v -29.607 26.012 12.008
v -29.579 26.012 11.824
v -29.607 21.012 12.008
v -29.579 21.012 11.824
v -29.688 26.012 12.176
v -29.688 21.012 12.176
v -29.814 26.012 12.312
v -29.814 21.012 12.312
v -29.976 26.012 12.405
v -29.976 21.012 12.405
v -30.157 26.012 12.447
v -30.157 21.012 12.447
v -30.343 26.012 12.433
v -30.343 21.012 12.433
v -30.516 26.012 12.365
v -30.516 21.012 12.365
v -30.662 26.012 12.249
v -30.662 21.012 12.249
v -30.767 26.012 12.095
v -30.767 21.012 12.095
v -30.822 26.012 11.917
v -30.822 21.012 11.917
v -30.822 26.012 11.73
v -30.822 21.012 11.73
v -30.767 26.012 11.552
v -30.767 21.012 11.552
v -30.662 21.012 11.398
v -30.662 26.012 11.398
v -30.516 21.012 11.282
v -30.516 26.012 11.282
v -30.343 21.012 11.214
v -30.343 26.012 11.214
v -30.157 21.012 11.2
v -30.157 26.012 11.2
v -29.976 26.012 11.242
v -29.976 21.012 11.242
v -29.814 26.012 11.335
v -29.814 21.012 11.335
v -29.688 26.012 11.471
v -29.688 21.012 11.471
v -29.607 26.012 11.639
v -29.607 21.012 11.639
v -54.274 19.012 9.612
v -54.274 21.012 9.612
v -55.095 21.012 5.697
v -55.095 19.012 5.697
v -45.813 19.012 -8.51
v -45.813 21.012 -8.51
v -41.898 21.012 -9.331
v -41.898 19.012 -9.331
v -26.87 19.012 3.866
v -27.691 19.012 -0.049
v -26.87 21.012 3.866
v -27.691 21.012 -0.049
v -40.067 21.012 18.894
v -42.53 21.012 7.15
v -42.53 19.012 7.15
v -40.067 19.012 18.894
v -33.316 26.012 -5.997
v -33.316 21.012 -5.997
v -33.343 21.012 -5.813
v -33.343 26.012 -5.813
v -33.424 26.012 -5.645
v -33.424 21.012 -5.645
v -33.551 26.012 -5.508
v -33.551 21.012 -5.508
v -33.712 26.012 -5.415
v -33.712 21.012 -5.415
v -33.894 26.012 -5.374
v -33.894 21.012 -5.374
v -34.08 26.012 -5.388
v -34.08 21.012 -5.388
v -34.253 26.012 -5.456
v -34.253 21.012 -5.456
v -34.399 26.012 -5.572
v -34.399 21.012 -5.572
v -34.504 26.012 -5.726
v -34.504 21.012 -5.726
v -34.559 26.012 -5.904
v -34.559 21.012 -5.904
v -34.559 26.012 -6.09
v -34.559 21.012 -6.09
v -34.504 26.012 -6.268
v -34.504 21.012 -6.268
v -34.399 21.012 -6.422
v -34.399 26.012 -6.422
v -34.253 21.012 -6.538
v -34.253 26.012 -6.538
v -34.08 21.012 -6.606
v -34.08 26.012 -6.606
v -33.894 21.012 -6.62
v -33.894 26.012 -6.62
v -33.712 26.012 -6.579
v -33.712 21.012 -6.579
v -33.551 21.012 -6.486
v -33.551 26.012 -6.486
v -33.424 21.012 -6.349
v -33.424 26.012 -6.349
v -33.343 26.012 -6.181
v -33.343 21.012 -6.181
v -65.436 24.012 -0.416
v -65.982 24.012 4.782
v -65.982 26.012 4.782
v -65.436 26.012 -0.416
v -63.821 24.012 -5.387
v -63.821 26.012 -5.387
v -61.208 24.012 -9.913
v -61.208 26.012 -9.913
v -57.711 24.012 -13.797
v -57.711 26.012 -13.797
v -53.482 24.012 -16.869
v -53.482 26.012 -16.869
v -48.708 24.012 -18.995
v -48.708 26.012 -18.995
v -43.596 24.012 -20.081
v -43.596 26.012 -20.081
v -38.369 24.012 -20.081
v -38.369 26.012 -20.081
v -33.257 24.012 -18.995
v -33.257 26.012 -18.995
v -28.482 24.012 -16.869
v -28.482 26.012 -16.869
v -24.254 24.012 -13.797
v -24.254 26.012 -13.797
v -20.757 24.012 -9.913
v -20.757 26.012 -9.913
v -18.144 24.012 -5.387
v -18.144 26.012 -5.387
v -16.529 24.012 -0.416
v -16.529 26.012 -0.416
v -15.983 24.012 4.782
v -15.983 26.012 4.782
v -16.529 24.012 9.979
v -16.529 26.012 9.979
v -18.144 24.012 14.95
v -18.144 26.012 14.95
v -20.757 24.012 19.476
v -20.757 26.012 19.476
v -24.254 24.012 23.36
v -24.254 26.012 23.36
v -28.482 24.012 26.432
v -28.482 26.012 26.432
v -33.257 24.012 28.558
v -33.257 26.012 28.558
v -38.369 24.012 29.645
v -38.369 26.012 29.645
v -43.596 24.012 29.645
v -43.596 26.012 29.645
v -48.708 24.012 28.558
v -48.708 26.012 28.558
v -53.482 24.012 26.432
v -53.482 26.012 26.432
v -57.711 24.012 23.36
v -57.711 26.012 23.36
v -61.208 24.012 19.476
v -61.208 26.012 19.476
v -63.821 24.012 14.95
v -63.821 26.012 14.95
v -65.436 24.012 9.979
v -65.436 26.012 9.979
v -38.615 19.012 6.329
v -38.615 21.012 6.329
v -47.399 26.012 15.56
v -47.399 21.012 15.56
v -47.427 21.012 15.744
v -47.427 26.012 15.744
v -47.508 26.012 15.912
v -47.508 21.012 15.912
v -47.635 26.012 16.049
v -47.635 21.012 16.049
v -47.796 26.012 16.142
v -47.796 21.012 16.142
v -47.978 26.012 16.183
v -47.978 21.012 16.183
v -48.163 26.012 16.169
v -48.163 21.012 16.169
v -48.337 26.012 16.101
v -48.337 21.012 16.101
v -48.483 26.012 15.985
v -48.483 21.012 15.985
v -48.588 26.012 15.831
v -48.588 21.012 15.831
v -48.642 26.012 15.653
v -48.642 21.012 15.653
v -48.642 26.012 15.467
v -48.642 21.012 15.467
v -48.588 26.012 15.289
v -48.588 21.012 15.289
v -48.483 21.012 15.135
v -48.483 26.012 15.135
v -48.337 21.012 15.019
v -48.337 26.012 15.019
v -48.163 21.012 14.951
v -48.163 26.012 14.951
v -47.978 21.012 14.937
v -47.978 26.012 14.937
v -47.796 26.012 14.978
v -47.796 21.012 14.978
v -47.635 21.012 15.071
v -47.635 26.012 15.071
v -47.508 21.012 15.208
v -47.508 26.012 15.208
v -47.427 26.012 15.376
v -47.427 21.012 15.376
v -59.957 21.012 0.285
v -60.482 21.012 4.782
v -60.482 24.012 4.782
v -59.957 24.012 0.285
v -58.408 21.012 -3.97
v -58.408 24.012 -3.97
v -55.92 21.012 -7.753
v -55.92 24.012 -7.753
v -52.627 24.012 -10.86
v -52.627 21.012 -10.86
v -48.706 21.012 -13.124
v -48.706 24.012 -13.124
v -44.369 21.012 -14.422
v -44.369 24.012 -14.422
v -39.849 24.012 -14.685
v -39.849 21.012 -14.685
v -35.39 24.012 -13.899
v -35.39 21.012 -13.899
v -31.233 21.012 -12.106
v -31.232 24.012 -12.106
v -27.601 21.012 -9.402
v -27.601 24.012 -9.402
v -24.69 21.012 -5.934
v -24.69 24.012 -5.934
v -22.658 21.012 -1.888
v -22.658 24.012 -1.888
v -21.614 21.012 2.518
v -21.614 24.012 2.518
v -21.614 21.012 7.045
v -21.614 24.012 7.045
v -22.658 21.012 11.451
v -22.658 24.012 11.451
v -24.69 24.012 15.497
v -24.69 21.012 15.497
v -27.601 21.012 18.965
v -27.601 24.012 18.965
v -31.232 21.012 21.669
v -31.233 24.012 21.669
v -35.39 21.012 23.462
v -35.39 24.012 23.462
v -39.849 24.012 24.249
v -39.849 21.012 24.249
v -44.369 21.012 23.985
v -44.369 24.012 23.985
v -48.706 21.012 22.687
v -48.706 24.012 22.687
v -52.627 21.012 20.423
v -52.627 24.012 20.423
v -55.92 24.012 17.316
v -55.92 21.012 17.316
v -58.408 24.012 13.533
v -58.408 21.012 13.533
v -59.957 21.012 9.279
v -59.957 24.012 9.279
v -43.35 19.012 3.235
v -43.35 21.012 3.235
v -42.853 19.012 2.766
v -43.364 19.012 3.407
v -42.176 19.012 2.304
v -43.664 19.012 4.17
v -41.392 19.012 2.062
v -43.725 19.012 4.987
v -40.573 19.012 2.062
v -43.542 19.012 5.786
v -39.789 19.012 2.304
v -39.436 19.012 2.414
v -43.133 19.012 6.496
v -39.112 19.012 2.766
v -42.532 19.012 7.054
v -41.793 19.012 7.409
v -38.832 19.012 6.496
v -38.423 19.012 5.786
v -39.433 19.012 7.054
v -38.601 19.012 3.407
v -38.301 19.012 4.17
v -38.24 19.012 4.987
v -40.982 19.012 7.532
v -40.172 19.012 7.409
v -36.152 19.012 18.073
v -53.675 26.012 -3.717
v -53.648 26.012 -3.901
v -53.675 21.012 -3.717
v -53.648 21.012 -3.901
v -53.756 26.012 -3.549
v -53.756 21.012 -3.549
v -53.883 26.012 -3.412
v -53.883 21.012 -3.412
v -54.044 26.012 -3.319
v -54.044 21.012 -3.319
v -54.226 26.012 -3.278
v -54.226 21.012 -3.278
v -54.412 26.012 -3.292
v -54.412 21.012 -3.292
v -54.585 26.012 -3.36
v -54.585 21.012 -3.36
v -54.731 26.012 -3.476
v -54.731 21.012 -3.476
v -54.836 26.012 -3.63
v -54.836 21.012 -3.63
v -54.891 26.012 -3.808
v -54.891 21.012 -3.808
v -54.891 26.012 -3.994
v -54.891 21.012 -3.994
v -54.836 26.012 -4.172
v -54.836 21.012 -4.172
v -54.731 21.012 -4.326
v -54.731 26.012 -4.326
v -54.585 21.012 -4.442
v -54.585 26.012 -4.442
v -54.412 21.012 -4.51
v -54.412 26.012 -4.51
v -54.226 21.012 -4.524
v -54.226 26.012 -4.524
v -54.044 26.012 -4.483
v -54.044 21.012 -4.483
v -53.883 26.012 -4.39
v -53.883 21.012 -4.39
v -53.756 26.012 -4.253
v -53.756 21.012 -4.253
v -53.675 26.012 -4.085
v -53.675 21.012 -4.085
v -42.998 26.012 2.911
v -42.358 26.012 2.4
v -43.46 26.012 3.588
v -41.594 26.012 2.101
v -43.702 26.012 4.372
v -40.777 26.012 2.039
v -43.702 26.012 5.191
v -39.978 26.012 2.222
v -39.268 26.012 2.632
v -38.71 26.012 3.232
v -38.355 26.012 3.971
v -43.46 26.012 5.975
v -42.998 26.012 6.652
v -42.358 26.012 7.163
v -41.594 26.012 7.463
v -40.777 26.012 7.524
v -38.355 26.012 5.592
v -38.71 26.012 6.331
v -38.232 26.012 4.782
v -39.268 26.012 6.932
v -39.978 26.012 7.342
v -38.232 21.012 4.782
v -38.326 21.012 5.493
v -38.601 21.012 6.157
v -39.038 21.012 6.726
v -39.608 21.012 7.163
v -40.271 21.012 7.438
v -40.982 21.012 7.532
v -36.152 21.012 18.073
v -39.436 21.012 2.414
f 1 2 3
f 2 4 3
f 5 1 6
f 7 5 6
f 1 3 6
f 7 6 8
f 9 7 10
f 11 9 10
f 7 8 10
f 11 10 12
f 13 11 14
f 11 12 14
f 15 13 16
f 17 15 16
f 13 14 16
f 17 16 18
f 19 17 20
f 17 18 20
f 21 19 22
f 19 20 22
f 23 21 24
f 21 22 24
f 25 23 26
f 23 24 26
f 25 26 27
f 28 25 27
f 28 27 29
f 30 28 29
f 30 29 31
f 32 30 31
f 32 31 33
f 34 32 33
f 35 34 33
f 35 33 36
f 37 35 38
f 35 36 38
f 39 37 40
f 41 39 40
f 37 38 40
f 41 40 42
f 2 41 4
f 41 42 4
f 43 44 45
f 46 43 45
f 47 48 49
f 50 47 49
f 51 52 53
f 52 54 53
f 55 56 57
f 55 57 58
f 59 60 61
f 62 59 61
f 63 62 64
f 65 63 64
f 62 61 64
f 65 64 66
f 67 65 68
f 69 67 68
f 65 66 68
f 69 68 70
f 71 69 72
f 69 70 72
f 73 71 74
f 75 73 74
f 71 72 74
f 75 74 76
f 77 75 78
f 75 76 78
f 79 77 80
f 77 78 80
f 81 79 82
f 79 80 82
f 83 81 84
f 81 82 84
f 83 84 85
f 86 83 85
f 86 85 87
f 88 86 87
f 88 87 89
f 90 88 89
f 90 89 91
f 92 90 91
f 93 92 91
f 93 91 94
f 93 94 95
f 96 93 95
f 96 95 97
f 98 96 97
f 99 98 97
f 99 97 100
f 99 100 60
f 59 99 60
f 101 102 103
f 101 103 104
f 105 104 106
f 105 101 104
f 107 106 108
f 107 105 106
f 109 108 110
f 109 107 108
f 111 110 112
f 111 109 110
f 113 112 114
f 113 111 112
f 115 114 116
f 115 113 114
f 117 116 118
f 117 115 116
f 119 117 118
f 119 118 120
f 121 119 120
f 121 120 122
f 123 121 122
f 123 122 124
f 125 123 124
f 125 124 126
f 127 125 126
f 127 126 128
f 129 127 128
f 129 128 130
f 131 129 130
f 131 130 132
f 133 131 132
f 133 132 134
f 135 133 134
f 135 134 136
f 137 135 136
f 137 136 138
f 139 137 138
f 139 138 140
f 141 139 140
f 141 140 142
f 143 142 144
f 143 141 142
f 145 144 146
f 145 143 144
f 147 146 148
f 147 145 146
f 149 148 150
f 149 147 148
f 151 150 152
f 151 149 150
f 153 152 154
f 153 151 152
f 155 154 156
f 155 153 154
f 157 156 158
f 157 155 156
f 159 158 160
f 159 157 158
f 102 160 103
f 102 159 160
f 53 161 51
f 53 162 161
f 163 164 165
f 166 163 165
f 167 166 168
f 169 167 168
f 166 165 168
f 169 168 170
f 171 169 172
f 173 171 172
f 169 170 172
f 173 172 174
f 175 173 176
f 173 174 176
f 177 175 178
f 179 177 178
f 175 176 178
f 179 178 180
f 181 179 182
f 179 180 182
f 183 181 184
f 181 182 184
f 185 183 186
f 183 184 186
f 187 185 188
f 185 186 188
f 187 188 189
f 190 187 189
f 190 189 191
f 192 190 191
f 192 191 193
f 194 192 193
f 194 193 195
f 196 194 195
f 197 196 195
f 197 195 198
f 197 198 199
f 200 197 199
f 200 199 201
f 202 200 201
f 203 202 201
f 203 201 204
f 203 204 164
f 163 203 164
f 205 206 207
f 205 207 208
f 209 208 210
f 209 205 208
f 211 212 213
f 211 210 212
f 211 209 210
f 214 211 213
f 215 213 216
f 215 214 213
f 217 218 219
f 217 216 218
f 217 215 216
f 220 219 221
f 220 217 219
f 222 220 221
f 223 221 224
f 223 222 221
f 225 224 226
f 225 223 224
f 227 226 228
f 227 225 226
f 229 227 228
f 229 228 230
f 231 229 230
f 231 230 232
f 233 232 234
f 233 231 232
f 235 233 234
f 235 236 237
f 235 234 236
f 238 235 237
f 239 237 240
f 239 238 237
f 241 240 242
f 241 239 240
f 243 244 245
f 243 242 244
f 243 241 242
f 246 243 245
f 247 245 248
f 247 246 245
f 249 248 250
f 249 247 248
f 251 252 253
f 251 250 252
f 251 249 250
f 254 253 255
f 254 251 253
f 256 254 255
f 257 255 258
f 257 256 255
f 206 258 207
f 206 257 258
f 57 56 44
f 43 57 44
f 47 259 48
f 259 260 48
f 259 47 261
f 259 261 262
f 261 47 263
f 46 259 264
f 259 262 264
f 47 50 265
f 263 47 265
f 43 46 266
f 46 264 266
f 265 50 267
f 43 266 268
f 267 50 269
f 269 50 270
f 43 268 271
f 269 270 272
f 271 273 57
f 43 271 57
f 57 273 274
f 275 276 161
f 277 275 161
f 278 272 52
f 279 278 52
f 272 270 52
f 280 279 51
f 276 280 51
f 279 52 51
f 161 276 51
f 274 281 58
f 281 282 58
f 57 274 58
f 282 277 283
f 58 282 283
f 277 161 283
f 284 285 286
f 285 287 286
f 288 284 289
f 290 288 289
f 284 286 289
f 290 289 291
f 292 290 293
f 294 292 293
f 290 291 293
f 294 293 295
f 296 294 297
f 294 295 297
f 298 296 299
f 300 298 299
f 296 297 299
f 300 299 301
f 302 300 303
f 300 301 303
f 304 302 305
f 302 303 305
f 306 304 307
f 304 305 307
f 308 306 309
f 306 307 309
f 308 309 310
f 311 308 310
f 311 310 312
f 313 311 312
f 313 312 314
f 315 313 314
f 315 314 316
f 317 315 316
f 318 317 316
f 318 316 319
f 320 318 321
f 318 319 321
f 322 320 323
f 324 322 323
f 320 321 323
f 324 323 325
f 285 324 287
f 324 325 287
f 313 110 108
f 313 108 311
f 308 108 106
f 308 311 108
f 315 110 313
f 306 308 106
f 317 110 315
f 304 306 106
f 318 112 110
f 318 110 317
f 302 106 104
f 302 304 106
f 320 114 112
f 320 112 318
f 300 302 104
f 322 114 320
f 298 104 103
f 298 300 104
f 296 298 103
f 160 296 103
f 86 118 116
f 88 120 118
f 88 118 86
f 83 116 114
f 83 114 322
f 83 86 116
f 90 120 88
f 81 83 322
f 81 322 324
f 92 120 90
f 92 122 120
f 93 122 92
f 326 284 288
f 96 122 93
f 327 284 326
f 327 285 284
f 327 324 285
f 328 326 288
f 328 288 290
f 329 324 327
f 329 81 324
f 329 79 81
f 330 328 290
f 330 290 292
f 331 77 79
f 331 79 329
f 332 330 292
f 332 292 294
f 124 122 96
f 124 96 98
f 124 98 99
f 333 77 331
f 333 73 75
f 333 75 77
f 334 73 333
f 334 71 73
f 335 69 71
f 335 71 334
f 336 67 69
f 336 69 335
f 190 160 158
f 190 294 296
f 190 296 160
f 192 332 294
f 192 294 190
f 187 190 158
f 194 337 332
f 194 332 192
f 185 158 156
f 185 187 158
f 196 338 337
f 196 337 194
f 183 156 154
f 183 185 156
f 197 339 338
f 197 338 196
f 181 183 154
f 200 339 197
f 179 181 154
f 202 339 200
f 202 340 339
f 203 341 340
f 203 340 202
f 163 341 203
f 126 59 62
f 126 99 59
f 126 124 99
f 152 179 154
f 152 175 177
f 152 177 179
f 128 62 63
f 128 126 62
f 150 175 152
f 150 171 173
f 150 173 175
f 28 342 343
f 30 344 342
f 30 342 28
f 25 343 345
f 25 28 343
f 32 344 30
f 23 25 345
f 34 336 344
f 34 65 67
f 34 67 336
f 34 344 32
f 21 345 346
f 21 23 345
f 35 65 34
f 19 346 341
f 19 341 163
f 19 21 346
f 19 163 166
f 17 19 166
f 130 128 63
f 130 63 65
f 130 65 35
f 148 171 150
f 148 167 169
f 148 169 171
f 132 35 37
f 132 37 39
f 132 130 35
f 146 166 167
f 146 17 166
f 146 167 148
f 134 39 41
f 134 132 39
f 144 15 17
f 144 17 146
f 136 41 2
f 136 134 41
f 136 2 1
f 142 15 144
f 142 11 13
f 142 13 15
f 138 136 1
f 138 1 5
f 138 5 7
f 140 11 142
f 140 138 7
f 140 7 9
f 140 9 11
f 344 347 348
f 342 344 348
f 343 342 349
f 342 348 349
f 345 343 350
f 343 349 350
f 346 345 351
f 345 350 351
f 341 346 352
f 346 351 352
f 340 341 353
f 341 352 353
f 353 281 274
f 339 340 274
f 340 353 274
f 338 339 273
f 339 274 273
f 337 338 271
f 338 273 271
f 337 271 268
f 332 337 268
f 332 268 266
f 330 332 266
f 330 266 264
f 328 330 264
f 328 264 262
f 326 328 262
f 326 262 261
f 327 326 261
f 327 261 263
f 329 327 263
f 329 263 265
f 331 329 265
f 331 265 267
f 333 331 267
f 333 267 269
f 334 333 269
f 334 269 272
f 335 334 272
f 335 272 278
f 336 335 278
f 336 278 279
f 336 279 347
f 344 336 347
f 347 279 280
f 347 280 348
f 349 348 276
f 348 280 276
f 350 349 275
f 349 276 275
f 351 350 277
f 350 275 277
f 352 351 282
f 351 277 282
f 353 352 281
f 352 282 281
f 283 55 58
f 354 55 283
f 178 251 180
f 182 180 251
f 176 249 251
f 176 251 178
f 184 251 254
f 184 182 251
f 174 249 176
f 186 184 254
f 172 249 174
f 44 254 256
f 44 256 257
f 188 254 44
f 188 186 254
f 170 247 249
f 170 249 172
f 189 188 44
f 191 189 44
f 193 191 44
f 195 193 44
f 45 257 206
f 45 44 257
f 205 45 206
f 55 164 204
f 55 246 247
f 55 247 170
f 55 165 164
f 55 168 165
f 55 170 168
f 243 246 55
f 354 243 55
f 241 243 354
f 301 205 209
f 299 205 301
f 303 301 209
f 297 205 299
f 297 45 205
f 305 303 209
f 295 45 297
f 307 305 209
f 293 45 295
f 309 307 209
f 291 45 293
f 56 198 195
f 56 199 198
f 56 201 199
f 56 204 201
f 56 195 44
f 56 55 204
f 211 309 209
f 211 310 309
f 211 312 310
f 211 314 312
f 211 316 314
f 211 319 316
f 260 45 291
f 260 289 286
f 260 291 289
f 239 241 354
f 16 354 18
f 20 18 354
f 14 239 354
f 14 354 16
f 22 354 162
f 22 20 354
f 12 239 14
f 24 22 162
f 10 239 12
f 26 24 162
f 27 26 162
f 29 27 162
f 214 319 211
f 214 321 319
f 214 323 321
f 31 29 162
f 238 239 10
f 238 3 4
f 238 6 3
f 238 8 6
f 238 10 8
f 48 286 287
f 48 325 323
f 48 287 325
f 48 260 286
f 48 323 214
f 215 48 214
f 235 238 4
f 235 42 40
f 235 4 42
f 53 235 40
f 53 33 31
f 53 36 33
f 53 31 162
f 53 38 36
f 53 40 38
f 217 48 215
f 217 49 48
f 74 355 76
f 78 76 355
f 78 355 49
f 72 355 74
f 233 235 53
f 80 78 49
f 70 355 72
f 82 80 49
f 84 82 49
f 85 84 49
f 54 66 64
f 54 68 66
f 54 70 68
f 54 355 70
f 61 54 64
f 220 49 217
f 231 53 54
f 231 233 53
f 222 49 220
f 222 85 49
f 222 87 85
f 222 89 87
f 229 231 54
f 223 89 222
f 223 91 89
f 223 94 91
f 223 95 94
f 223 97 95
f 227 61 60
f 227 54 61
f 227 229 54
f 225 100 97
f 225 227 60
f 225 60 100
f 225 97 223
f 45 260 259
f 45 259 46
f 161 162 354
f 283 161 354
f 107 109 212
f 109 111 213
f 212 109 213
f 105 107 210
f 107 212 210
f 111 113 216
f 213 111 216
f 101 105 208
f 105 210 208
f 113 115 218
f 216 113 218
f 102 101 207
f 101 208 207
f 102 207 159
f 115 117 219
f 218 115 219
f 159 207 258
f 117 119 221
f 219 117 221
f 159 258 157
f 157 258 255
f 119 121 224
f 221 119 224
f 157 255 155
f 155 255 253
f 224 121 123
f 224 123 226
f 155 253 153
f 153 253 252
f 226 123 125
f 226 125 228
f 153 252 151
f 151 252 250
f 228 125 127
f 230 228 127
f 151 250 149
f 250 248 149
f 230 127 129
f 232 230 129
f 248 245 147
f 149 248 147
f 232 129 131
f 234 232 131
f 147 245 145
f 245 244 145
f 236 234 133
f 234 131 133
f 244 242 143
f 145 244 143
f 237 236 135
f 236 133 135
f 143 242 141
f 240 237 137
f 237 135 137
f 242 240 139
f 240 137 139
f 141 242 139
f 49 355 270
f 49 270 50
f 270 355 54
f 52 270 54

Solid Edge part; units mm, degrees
sketch "Sketch1" plane through (0, 16.012, 0) normal (0, -1, 0) x (1, 0, 0)
  circle A0 centre (-40.9825, 4.7816) radius 25
extrude "Protrusion1" add sketch "Sketch1" against normal blind 2
sketch "Sketch2" plane through (-40.9825, 18.012, 4.7816) normal (0, 1, 0) x (-1, 0, 0)
  circle A0 centre (0, 0) radius 19.5
extrude "ExtrudedProtrusion_2" add sketch "Sketch2" along normal blind 6
sketch "Sketch3" plane through (-40.9825, 24.012, 4.7816) normal (0, 1, 0) x (-1, 0, 0)
  circle A0 centre (0, 0) radius 25
extrude "ExtrudedProtrusion_3" add sketch "Sketch3" along normal blind 2
sketch "Sketch4" plane through (0, 16.012, 0) normal (0, -1, 0) x (1, 0, 0)
  line L0 (-39.6249, 14.0146) -> (-47.4069, 22.165)
  arc A0 (-47.4069, 22.165) -> (-54.3209, 17.6479) centre (-50.4446, 19.2646) ccw
  line L1 (-54.3209, 17.6479) -> (-49.9832, 7.2473)
  arc A1 (-49.9832, 7.2473) -> (-50.2155, 6.1391) centre (-50.9061, 6.8624) cw
  line L2 (-50.2155, 6.1391) -> (-58.3659, -1.6428)
  arc A2 (-58.3659, -1.6428) -> (-53.8487, -8.5569) centre (-55.4655, -4.6805) ccw
  line L3 (-53.8487, -8.5569) -> (-43.4482, -4.2191)
  arc A3 (-43.4482, -4.2191) -> (-42.34, -4.4515) centre (-43.0633, -5.142) cw
  line L4 (-42.34, -4.4515) -> (-34.5581, -12.6018)
  arc A4 (-34.5581, -12.6018) -> (-27.644, -8.0847) centre (-31.5204, -9.7014) ccw
  line L5 (-27.644, -8.0847) -> (-31.9818, 2.3158)
  arc A5 (-31.9818, 2.3158) -> (-31.7494, 3.424) centre (-31.0588, 2.7008) cw
  line L6 (-31.7494, 3.424) -> (-23.5991, 11.206)
  arc A6 (-23.5991, 11.206) -> (-28.1162, 18.1201) centre (-26.4995, 14.2437) ccw
  line L7 (-28.1162, 18.1201) -> (-38.5167, 13.7823)
  arc A7 (-38.5167, 13.7823) -> (-39.6249, 14.0146) centre (-38.9017, 14.7052) cw
  line L8 (-38.6527, 15.8925) -> (-45.9604, 23.5461)
  arc A8 (-45.9604, 23.5461) -> (-56.1668, 16.878) centre (-50.4446, 19.2646) ccw
  line L9 (-56.1668, 16.878) -> (-52.0934, 7.1114)
  line L10 (-52.0934, 7.1114) -> (-59.747, -0.1963)
  arc A9 (-59.747, -0.1963) -> (-53.0789, -10.4028) centre (-55.4655, -4.6805) ccw
  line L11 (-53.0789, -10.4028) -> (-43.3122, -6.3294)
  line L12 (-43.3122, -6.3294) -> (-36.0046, -13.983)
  arc A10 (-36.0046, -13.983) -> (-25.7981, -7.3148) centre (-31.5204, -9.7014) ccw
  line L13 (-25.7981, -7.3148) -> (-29.8715, 2.4518)
  line L14 (-29.8715, 2.4518) -> (-22.2179, 9.7595)
  arc A11 (-22.2179, 9.7595) -> (-28.8861, 19.966) centre (-26.4995, 14.2437) ccw
  line L15 (-28.8861, 19.966) -> (-38.6527, 15.8925)
  dimension "D1" = 2
  dimension "D2" = 2
extrude "ExtrudedProtrusion_4" add sketch "Sketch4" along normal blind 2
fillet "Round_1" radius 1.5 16 edges at (-60.6559, 16.012, -8.0716) (-48.1956, 16.012, -8.3661) (-55.9202, 16.012, 3.4575) (-39.6584, 16.012, -10.1562) (-28.1293, 16.012, -14.8918) (-27.8348, 16.012, -2.4315) (-43.3122, 15.012, -6.3294) (-29.8715, 15.012, 2.4518) (-26.0447, 16.012, 6.1056) (-21.309, 16.012, 17.6348) (-33.7694, 16.012, 17.9293) (-38.6527, 15.012, 15.8925) (-42.3065, 16.012, 19.7193) (-53.8356, 16.012, 24.455) (-54.1301, 16.012, 11.9947) (-52.0934, 15.012, 7.1114)
sketch "Sketch5" plane through (0, 16.012, 0) normal (0, -1, 0) x (1, 0, 0)
  circle A0 centre (-40.9825, 4.7816) radius 2.75
extrude "Cutout1" cut sketch "Sketch5" against normal up to vertex (10 mm away)
sketch "Sketch6" plane through (0, 16.012, 0) normal (0, -1, 0) x (1, 0, 0)
  circle A0 centre (-30.2039, 11.8235) radius 0.625
  circle A1 centre (-48.0244, 15.5601) radius 0.625
  circle A2 centre (-54.2725, -3.9011) radius 0.625
  circle A3 centre (-33.9406, -5.9969) radius 0.625
  dimension "D1" = 2
  dimension "D2" = 2
extrude "Cutout2" cut sketch "Sketch6" against normal up to vertex (10 mm away)
sketch "Sketch7" plane through (-40.9825, 14.012, 4.7816) normal (0, -1, 0) x (0.9229, 0, 0.3849)
  arc A0 (-5.7404, -7.358) -> (-4.8071, -7.999) centre (-5.7404, -8.358) cw
  line L0 (-4.8071, -7.999) -> (-0.7621, -18.5169)
  arc A1 (-0.7621, -18.5169) -> (7.358, -17.0093) centre (3.158, -17.0093) ccw
  line L1 (7.358, -17.0093) -> (7.358, -5.7404)
  arc A2 (7.358, -5.7404) -> (7.999, -4.8071) centre (8.358, -5.7404) cw
  line L2 (7.999, -4.8071) -> (18.5169, -0.7621)
  arc A3 (18.5169, -0.7621) -> (17.0093, 7.358) centre (17.0093, 3.158) ccw
  line L3 (17.0093, 7.358) -> (5.7404, 7.358)
  arc A4 (5.7404, 7.358) -> (4.8071, 7.999) centre (5.7404, 8.358) cw
  line L4 (4.8071, 7.999) -> (0.7621, 18.5169)
  arc A5 (0.7621, 18.5169) -> (-7.358, 17.0093) centre (-3.158, 17.0093) ccw
  line L5 (-7.358, 17.0093) -> (-7.358, 5.7404)
  arc A6 (-7.358, 5.7404) -> (-7.999, 4.8071) centre (-8.358, 5.7404) cw
  line L6 (-7.999, 4.8071) -> (-18.5169, 0.7621)
  arc A7 (-18.5169, 0.7621) -> (-17.0093, -7.358) centre (-17.0093, -3.158) ccw
  line L7 (-17.0093, -7.358) -> (-5.7404, -7.358)
  arc A8 (-5.7404, -5.858) -> (-3.407, -7.4606) centre (-5.7404, -8.358) cw
  line L8 (-3.407, -7.4606) -> (0.6379, -17.9785)
  arc A9 (0.6379, -17.9785) -> (5.858, -17.0093) centre (3.158, -17.0093) ccw
  line L9 (5.858, -17.0093) -> (5.858, -5.7404)
  arc A10 (5.858, -5.7404) -> (7.4606, -3.407) centre (8.358, -5.7404) cw
  line L10 (7.4606, -3.407) -> (17.9785, 0.6379)
  arc A11 (17.9785, 0.6379) -> (17.0093, 5.858) centre (17.0093, 3.158) ccw
  line L11 (17.0093, 5.858) -> (5.7404, 5.858)
  arc A12 (5.7404, 5.858) -> (3.407, 7.4606) centre (5.7404, 8.358) cw
  line L12 (3.407, 7.4606) -> (-0.6379, 17.9785)
  arc A13 (-0.6379, 17.9785) -> (-5.858, 17.0093) centre (-3.158, 17.0093) ccw
  line L13 (-5.858, 17.0093) -> (-5.858, 5.7404)
  arc A14 (-5.858, 5.7404) -> (-7.4606, 3.407) centre (-8.358, 5.7404) cw
  line L14 (-7.4606, 3.407) -> (-17.9785, -0.6379)
  arc A15 (-17.9785, -0.6379) -> (-17.0093, -5.858) centre (-17.0093, -3.158) ccw
  line L15 (-17.0093, -5.858) -> (-5.7404, -5.858)
  dimension "D1" = 0.5
extrude "Protrusion2" add sketch "Sketch7" against normal up to vertex (2 mm away)
sketch "Sketch8" plane through (-40.9825, 14.012, 4.7816) normal (0, -1, 0) x (0.9229, 0, 0.3849)
  circle A0 centre (0, 0) radius 32.9501
extrude "ExtrudedCutout_4" cut sketch "Sketch8" against normal blind 7
sketch "Sketch9" plane through (-40.9825, 21.012, 4.7816) normal (0, -1, 0) x (0, 0, 1)
  line L0 (-1.547, 2.3679) -> (0.9156, 14.1125)
  line L1 (4.8305, 13.2916) -> (0.9156, 14.1125)
  line L2 (2.3679, 1.547) -> (4.8305, 13.2916)
  line L3 (2.3679, 1.547) -> (14.1125, -0.9156)
  line L4 (14.1125, -0.9156) -> (13.2916, -4.8305)
  line L5 (1.547, -2.3679) -> (13.2916, -4.8305)
  line L6 (1.547, -2.3679) -> (-0.9156, -14.1125)
  line L7 (-4.8305, -13.2916) -> (-0.9156, -14.1125)
  line L8 (-2.3679, -1.547) -> (-4.8305, -13.2916)
  line L9 (-2.3679, -1.547) -> (-14.1125, 0.9156)
  line L10 (-13.2916, 4.8305) -> (-14.1125, 0.9156)
  line L11 (-1.547, 2.3679) -> (-13.2916, 4.8305)
  circle A0 centre (0, 0) radius 2.75
extrude "ExtrudedProtrusion_6" add sketch "Sketch9" along normal blind 2
properties material "ABS Plastic, medium impact"
